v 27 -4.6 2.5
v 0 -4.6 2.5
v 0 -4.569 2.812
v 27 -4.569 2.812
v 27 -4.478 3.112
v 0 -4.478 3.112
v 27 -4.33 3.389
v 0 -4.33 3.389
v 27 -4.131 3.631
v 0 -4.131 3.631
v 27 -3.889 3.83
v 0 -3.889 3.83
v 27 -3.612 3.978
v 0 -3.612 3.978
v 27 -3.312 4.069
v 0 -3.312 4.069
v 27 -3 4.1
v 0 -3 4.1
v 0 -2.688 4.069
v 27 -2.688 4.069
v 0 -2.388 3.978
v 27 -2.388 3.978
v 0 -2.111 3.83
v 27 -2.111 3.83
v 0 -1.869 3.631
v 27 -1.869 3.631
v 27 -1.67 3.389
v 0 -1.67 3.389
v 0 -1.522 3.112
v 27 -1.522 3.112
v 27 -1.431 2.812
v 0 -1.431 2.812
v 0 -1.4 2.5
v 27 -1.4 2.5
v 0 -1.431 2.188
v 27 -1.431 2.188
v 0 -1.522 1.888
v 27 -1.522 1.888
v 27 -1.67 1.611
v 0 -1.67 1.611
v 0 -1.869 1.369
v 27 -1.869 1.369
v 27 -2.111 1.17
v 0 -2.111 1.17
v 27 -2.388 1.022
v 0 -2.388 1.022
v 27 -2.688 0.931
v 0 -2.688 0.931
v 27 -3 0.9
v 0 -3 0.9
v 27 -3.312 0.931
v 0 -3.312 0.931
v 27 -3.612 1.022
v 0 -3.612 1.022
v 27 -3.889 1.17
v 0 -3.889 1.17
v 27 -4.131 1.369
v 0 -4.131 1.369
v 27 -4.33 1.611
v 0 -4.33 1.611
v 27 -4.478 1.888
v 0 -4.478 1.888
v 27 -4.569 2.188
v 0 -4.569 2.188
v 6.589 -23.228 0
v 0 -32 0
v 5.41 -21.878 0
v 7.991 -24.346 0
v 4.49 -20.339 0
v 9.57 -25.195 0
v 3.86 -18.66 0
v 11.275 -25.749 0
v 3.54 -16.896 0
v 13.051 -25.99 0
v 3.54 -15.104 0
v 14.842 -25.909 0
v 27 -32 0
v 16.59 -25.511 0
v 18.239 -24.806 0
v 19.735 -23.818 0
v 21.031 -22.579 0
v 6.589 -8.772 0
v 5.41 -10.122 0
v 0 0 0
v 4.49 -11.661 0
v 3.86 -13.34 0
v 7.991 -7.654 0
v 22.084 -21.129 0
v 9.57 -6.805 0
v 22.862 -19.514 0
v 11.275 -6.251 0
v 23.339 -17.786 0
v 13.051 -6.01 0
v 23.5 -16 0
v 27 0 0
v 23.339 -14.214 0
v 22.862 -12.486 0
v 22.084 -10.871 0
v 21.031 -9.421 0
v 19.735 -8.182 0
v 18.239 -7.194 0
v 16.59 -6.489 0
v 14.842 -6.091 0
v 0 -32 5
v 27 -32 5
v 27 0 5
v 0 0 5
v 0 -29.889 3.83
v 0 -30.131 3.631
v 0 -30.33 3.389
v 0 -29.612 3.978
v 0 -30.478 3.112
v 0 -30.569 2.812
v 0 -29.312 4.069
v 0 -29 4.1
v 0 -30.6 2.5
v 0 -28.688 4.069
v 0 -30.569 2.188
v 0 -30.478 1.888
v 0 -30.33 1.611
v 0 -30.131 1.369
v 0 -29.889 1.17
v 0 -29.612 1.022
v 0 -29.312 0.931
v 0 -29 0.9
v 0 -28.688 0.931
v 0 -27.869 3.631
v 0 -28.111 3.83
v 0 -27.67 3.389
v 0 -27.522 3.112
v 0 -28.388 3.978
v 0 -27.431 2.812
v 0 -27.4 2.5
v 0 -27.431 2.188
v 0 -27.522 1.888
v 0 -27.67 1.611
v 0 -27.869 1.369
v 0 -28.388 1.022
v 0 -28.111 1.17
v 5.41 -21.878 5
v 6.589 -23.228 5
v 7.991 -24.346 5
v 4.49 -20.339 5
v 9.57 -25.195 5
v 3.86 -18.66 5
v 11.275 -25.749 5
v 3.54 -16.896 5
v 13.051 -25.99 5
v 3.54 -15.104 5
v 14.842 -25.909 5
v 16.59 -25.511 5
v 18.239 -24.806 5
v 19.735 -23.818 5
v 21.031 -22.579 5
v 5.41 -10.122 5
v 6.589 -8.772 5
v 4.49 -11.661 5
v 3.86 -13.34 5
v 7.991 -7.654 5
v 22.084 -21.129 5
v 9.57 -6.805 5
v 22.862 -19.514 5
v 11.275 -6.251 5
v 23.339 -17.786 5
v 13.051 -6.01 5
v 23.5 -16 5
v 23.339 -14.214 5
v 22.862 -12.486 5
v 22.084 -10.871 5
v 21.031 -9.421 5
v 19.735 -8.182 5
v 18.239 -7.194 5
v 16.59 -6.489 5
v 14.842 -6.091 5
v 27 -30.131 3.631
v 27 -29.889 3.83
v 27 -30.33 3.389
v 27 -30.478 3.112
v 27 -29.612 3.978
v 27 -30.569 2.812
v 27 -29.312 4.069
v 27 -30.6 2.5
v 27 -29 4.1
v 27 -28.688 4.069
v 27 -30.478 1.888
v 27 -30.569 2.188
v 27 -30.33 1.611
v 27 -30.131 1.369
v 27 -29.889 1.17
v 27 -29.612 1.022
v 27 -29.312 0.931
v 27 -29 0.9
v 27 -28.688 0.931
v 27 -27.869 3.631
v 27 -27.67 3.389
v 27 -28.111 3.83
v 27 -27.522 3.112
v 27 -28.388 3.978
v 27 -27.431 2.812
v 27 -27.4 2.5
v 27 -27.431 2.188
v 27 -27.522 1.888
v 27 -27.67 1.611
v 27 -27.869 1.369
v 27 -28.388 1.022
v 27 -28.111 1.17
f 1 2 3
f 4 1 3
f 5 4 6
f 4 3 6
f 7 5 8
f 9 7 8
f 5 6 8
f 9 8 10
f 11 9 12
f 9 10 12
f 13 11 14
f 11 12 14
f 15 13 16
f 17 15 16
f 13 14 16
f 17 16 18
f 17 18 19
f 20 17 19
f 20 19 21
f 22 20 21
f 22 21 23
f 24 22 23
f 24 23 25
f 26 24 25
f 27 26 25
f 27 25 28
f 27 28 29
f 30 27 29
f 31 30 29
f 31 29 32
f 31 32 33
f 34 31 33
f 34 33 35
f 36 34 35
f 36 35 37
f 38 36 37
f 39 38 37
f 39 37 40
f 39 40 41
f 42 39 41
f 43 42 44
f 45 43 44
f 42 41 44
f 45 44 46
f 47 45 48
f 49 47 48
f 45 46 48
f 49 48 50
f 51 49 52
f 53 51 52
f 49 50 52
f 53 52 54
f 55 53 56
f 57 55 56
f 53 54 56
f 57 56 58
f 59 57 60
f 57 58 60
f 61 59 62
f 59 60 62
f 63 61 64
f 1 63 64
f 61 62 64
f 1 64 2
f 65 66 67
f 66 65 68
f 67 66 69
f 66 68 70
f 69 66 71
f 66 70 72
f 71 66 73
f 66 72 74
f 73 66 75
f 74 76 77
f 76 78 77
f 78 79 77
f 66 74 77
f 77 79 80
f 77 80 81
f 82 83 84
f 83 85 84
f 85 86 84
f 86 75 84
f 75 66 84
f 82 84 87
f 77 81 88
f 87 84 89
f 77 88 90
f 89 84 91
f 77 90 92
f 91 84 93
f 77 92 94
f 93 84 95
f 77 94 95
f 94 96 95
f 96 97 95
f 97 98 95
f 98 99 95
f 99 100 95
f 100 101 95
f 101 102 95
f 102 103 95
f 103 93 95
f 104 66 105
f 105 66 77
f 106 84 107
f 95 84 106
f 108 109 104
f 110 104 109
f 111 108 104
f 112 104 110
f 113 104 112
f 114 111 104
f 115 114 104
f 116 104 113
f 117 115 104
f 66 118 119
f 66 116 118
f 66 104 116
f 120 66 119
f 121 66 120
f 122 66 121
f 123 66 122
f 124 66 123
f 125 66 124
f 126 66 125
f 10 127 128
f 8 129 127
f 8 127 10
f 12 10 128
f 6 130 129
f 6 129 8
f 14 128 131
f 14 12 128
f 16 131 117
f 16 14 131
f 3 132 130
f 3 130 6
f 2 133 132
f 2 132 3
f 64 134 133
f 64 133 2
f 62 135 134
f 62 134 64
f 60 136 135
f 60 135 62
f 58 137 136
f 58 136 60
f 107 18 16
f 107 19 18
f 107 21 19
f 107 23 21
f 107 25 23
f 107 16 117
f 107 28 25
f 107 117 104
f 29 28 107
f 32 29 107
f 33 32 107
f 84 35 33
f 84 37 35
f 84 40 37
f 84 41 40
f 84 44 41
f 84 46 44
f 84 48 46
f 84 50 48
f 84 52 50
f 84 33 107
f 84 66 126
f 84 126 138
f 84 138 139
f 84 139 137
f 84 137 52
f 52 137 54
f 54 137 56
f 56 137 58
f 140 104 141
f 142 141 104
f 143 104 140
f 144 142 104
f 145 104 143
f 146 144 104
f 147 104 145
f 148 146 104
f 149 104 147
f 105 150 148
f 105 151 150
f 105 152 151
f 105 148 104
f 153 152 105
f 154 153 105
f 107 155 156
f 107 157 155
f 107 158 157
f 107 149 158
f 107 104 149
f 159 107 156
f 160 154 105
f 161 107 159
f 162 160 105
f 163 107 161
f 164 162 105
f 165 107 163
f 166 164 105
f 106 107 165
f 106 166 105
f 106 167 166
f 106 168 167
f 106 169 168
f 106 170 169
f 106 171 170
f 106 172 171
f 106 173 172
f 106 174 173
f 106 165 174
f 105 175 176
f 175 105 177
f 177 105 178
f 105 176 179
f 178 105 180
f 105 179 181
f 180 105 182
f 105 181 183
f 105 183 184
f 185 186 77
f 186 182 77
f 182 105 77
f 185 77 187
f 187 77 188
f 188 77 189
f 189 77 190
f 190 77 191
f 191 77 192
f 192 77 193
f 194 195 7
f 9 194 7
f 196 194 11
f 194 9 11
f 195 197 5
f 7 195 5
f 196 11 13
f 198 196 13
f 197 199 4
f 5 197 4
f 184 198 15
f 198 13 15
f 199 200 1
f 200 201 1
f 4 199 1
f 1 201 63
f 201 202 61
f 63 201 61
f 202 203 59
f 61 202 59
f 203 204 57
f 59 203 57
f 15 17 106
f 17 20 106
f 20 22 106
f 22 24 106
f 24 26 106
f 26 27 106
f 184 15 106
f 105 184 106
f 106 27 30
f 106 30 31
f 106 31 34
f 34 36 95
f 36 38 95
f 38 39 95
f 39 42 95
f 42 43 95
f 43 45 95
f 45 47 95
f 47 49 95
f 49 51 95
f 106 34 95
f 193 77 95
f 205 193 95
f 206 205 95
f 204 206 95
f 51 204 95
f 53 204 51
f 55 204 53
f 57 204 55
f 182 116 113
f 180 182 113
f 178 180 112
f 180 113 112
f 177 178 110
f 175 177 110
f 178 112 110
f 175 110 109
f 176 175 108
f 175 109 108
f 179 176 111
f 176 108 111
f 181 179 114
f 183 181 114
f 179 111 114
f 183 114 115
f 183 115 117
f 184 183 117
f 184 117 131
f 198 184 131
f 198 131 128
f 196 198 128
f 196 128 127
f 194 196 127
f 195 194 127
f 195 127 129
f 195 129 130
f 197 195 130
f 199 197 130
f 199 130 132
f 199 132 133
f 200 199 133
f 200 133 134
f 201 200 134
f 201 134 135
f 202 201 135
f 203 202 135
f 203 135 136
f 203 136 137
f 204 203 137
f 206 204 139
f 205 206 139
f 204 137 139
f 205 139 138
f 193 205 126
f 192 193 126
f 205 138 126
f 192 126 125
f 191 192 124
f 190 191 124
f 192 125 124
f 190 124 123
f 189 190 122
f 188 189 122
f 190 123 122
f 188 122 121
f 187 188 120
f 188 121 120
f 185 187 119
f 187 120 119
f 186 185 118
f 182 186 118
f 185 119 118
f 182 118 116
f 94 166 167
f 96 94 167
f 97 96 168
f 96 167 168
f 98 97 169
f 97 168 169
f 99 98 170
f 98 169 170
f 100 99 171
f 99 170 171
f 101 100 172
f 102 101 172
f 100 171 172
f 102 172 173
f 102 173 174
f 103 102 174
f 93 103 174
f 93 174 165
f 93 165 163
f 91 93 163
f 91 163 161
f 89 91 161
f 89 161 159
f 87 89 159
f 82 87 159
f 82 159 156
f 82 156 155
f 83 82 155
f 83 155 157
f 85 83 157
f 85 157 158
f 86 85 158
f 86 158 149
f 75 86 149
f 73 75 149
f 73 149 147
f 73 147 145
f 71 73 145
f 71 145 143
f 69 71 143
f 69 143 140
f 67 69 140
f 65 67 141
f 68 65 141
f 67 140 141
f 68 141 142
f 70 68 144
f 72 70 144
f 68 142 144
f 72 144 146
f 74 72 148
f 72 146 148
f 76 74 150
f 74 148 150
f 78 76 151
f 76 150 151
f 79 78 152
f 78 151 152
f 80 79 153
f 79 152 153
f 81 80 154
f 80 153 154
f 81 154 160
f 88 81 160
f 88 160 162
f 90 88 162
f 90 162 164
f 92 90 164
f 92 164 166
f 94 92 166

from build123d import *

# Parameters (mm, degrees)
SKETCH_2_W          = 27
SKETCH_2_H          = 32
EXTRUDE_1_DEPTH     = 5
SKETCH_3_R          = 10
CUT_EXTRUDE_1_DEPTH = 64
SKETCH_5_R          = 1.6
CUT_EXTRUDE_2_DEPTH = 64


with BuildPart() as part:
    # 草图2 → 凸台-拉伸1 (new body)
    with BuildSketch(Plane.XY):
        with Locations((13.5, -16)):
            Rectangle(SKETCH_2_W, SKETCH_2_H)
    extrude(amount=EXTRUDE_1_DEPTH)

    # 草图3 → 切除-拉伸1 (cut)
    with BuildSketch(Plane.XY.offset(5)):
        with Locations((13.5, -16)):
            Circle(SKETCH_3_R)
    extrude(amount=-CUT_EXTRUDE_1_DEPTH, mode=Mode.SUBTRACT)

    # 草图5 → 切除-拉伸2 (cut)
    with BuildSketch(Plane.ZY):
        with Locations(Location((2.5, -3, 0), (0, 0, 270))):
            Circle(SKETCH_5_R)
        with Locations(Location((2.5, -29, 0), (0, 0, 270))):
            Circle(SKETCH_5_R)
    extrude(amount=-CUT_EXTRUDE_2_DEPTH, mode=Mode.SUBTRACT)


solid = part.part
